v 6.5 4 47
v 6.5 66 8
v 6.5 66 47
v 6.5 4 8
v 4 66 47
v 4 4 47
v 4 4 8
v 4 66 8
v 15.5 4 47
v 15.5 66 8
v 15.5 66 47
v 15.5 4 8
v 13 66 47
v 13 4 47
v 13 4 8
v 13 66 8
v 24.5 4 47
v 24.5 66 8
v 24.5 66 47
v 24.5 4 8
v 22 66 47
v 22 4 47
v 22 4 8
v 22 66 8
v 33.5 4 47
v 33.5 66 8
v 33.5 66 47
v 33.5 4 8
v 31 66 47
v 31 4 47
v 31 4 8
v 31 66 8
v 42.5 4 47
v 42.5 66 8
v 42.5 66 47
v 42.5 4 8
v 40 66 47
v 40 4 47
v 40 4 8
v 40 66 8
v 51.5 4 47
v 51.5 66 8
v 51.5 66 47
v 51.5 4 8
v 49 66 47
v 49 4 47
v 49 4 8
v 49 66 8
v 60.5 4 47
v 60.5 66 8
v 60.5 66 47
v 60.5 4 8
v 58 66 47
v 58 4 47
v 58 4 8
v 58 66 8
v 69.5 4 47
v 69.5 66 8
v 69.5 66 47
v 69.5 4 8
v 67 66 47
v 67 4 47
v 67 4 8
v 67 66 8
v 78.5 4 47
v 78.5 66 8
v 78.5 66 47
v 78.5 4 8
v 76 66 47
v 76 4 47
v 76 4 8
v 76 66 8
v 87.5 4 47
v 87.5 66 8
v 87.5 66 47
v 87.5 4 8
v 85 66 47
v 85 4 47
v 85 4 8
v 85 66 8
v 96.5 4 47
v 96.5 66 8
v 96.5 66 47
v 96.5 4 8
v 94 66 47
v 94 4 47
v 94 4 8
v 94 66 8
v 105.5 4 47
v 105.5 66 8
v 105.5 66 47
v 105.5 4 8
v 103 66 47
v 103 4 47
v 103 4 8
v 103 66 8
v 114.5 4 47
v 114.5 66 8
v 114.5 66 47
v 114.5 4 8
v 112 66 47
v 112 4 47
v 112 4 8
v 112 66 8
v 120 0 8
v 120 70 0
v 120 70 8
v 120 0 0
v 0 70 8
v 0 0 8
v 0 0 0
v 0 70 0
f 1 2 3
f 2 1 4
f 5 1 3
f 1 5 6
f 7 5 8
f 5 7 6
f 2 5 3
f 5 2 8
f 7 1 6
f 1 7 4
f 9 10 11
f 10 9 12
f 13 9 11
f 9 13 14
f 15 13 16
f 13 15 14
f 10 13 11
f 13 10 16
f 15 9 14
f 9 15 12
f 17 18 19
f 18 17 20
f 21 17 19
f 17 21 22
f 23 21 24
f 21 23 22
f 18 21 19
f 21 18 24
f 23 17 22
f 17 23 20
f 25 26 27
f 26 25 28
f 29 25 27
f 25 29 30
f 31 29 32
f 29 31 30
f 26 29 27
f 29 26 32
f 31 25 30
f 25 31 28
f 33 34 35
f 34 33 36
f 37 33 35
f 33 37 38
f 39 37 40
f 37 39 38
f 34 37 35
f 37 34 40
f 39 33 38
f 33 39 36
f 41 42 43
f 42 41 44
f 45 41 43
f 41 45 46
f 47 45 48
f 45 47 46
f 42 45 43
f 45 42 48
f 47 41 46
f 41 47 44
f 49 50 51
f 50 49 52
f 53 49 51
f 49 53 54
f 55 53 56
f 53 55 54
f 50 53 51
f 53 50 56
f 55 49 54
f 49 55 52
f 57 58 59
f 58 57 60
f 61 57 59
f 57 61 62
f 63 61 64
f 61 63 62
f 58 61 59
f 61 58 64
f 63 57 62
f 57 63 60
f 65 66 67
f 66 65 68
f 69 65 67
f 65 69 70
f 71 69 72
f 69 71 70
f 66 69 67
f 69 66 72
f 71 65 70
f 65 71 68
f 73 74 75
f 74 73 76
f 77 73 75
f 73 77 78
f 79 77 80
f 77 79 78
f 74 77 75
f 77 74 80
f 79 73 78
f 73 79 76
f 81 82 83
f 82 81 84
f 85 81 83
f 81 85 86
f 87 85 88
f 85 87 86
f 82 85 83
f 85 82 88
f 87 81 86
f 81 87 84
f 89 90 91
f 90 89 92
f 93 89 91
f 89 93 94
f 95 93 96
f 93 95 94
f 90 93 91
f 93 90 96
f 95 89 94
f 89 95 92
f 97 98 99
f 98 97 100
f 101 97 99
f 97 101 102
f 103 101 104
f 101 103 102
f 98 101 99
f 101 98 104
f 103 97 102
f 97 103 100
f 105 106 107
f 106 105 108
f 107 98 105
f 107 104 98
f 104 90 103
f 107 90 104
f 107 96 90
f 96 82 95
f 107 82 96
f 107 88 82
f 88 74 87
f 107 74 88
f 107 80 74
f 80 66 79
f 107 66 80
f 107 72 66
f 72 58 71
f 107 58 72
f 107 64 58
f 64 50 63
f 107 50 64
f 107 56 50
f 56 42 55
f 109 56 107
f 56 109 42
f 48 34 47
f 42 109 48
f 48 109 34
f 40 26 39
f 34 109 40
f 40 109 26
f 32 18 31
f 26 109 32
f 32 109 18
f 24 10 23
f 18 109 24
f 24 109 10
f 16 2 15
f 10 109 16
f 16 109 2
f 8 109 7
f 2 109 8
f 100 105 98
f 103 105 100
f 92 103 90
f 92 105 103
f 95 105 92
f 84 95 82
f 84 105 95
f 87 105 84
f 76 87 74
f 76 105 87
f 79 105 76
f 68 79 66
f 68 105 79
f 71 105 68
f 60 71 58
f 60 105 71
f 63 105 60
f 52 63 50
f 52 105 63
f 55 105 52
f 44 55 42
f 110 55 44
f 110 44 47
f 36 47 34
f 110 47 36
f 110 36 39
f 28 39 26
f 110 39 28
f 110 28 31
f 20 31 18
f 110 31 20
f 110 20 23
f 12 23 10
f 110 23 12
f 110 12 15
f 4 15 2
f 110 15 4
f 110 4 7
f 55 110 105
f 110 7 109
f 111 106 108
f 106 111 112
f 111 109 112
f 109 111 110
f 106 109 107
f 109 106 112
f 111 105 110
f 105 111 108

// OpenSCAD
$fn = 32;

// ----------------------------------------------------------------------
// Heatsink: uniform fin block
// ----------------------------------------------------------------------

// --- parameters (mm) ---
base_l = 120;             // base length, X
base_w = 70;              // base width, Y
base_t = 8;               // base plate thickness
fin_h = 40;               // fin height above the base
fin_t = 2.5;              // fin thickness
edge = 4;                 // margin from the base ends
pitch = 9;                // fin pitch

n_fins = floor((base_l - 2 * edge - fin_t) / pitch) + 1;  // fin count
total_h = base_t + fin_h - 1;  // overall height

union() {
  cube([base_l, base_w, base_t]);
  for (i = [0 : n_fins - 1])
    translate([edge + i * pitch, edge, base_t - 1])
      cube([fin_t, base_w - 2 * edge, fin_h]);
}
